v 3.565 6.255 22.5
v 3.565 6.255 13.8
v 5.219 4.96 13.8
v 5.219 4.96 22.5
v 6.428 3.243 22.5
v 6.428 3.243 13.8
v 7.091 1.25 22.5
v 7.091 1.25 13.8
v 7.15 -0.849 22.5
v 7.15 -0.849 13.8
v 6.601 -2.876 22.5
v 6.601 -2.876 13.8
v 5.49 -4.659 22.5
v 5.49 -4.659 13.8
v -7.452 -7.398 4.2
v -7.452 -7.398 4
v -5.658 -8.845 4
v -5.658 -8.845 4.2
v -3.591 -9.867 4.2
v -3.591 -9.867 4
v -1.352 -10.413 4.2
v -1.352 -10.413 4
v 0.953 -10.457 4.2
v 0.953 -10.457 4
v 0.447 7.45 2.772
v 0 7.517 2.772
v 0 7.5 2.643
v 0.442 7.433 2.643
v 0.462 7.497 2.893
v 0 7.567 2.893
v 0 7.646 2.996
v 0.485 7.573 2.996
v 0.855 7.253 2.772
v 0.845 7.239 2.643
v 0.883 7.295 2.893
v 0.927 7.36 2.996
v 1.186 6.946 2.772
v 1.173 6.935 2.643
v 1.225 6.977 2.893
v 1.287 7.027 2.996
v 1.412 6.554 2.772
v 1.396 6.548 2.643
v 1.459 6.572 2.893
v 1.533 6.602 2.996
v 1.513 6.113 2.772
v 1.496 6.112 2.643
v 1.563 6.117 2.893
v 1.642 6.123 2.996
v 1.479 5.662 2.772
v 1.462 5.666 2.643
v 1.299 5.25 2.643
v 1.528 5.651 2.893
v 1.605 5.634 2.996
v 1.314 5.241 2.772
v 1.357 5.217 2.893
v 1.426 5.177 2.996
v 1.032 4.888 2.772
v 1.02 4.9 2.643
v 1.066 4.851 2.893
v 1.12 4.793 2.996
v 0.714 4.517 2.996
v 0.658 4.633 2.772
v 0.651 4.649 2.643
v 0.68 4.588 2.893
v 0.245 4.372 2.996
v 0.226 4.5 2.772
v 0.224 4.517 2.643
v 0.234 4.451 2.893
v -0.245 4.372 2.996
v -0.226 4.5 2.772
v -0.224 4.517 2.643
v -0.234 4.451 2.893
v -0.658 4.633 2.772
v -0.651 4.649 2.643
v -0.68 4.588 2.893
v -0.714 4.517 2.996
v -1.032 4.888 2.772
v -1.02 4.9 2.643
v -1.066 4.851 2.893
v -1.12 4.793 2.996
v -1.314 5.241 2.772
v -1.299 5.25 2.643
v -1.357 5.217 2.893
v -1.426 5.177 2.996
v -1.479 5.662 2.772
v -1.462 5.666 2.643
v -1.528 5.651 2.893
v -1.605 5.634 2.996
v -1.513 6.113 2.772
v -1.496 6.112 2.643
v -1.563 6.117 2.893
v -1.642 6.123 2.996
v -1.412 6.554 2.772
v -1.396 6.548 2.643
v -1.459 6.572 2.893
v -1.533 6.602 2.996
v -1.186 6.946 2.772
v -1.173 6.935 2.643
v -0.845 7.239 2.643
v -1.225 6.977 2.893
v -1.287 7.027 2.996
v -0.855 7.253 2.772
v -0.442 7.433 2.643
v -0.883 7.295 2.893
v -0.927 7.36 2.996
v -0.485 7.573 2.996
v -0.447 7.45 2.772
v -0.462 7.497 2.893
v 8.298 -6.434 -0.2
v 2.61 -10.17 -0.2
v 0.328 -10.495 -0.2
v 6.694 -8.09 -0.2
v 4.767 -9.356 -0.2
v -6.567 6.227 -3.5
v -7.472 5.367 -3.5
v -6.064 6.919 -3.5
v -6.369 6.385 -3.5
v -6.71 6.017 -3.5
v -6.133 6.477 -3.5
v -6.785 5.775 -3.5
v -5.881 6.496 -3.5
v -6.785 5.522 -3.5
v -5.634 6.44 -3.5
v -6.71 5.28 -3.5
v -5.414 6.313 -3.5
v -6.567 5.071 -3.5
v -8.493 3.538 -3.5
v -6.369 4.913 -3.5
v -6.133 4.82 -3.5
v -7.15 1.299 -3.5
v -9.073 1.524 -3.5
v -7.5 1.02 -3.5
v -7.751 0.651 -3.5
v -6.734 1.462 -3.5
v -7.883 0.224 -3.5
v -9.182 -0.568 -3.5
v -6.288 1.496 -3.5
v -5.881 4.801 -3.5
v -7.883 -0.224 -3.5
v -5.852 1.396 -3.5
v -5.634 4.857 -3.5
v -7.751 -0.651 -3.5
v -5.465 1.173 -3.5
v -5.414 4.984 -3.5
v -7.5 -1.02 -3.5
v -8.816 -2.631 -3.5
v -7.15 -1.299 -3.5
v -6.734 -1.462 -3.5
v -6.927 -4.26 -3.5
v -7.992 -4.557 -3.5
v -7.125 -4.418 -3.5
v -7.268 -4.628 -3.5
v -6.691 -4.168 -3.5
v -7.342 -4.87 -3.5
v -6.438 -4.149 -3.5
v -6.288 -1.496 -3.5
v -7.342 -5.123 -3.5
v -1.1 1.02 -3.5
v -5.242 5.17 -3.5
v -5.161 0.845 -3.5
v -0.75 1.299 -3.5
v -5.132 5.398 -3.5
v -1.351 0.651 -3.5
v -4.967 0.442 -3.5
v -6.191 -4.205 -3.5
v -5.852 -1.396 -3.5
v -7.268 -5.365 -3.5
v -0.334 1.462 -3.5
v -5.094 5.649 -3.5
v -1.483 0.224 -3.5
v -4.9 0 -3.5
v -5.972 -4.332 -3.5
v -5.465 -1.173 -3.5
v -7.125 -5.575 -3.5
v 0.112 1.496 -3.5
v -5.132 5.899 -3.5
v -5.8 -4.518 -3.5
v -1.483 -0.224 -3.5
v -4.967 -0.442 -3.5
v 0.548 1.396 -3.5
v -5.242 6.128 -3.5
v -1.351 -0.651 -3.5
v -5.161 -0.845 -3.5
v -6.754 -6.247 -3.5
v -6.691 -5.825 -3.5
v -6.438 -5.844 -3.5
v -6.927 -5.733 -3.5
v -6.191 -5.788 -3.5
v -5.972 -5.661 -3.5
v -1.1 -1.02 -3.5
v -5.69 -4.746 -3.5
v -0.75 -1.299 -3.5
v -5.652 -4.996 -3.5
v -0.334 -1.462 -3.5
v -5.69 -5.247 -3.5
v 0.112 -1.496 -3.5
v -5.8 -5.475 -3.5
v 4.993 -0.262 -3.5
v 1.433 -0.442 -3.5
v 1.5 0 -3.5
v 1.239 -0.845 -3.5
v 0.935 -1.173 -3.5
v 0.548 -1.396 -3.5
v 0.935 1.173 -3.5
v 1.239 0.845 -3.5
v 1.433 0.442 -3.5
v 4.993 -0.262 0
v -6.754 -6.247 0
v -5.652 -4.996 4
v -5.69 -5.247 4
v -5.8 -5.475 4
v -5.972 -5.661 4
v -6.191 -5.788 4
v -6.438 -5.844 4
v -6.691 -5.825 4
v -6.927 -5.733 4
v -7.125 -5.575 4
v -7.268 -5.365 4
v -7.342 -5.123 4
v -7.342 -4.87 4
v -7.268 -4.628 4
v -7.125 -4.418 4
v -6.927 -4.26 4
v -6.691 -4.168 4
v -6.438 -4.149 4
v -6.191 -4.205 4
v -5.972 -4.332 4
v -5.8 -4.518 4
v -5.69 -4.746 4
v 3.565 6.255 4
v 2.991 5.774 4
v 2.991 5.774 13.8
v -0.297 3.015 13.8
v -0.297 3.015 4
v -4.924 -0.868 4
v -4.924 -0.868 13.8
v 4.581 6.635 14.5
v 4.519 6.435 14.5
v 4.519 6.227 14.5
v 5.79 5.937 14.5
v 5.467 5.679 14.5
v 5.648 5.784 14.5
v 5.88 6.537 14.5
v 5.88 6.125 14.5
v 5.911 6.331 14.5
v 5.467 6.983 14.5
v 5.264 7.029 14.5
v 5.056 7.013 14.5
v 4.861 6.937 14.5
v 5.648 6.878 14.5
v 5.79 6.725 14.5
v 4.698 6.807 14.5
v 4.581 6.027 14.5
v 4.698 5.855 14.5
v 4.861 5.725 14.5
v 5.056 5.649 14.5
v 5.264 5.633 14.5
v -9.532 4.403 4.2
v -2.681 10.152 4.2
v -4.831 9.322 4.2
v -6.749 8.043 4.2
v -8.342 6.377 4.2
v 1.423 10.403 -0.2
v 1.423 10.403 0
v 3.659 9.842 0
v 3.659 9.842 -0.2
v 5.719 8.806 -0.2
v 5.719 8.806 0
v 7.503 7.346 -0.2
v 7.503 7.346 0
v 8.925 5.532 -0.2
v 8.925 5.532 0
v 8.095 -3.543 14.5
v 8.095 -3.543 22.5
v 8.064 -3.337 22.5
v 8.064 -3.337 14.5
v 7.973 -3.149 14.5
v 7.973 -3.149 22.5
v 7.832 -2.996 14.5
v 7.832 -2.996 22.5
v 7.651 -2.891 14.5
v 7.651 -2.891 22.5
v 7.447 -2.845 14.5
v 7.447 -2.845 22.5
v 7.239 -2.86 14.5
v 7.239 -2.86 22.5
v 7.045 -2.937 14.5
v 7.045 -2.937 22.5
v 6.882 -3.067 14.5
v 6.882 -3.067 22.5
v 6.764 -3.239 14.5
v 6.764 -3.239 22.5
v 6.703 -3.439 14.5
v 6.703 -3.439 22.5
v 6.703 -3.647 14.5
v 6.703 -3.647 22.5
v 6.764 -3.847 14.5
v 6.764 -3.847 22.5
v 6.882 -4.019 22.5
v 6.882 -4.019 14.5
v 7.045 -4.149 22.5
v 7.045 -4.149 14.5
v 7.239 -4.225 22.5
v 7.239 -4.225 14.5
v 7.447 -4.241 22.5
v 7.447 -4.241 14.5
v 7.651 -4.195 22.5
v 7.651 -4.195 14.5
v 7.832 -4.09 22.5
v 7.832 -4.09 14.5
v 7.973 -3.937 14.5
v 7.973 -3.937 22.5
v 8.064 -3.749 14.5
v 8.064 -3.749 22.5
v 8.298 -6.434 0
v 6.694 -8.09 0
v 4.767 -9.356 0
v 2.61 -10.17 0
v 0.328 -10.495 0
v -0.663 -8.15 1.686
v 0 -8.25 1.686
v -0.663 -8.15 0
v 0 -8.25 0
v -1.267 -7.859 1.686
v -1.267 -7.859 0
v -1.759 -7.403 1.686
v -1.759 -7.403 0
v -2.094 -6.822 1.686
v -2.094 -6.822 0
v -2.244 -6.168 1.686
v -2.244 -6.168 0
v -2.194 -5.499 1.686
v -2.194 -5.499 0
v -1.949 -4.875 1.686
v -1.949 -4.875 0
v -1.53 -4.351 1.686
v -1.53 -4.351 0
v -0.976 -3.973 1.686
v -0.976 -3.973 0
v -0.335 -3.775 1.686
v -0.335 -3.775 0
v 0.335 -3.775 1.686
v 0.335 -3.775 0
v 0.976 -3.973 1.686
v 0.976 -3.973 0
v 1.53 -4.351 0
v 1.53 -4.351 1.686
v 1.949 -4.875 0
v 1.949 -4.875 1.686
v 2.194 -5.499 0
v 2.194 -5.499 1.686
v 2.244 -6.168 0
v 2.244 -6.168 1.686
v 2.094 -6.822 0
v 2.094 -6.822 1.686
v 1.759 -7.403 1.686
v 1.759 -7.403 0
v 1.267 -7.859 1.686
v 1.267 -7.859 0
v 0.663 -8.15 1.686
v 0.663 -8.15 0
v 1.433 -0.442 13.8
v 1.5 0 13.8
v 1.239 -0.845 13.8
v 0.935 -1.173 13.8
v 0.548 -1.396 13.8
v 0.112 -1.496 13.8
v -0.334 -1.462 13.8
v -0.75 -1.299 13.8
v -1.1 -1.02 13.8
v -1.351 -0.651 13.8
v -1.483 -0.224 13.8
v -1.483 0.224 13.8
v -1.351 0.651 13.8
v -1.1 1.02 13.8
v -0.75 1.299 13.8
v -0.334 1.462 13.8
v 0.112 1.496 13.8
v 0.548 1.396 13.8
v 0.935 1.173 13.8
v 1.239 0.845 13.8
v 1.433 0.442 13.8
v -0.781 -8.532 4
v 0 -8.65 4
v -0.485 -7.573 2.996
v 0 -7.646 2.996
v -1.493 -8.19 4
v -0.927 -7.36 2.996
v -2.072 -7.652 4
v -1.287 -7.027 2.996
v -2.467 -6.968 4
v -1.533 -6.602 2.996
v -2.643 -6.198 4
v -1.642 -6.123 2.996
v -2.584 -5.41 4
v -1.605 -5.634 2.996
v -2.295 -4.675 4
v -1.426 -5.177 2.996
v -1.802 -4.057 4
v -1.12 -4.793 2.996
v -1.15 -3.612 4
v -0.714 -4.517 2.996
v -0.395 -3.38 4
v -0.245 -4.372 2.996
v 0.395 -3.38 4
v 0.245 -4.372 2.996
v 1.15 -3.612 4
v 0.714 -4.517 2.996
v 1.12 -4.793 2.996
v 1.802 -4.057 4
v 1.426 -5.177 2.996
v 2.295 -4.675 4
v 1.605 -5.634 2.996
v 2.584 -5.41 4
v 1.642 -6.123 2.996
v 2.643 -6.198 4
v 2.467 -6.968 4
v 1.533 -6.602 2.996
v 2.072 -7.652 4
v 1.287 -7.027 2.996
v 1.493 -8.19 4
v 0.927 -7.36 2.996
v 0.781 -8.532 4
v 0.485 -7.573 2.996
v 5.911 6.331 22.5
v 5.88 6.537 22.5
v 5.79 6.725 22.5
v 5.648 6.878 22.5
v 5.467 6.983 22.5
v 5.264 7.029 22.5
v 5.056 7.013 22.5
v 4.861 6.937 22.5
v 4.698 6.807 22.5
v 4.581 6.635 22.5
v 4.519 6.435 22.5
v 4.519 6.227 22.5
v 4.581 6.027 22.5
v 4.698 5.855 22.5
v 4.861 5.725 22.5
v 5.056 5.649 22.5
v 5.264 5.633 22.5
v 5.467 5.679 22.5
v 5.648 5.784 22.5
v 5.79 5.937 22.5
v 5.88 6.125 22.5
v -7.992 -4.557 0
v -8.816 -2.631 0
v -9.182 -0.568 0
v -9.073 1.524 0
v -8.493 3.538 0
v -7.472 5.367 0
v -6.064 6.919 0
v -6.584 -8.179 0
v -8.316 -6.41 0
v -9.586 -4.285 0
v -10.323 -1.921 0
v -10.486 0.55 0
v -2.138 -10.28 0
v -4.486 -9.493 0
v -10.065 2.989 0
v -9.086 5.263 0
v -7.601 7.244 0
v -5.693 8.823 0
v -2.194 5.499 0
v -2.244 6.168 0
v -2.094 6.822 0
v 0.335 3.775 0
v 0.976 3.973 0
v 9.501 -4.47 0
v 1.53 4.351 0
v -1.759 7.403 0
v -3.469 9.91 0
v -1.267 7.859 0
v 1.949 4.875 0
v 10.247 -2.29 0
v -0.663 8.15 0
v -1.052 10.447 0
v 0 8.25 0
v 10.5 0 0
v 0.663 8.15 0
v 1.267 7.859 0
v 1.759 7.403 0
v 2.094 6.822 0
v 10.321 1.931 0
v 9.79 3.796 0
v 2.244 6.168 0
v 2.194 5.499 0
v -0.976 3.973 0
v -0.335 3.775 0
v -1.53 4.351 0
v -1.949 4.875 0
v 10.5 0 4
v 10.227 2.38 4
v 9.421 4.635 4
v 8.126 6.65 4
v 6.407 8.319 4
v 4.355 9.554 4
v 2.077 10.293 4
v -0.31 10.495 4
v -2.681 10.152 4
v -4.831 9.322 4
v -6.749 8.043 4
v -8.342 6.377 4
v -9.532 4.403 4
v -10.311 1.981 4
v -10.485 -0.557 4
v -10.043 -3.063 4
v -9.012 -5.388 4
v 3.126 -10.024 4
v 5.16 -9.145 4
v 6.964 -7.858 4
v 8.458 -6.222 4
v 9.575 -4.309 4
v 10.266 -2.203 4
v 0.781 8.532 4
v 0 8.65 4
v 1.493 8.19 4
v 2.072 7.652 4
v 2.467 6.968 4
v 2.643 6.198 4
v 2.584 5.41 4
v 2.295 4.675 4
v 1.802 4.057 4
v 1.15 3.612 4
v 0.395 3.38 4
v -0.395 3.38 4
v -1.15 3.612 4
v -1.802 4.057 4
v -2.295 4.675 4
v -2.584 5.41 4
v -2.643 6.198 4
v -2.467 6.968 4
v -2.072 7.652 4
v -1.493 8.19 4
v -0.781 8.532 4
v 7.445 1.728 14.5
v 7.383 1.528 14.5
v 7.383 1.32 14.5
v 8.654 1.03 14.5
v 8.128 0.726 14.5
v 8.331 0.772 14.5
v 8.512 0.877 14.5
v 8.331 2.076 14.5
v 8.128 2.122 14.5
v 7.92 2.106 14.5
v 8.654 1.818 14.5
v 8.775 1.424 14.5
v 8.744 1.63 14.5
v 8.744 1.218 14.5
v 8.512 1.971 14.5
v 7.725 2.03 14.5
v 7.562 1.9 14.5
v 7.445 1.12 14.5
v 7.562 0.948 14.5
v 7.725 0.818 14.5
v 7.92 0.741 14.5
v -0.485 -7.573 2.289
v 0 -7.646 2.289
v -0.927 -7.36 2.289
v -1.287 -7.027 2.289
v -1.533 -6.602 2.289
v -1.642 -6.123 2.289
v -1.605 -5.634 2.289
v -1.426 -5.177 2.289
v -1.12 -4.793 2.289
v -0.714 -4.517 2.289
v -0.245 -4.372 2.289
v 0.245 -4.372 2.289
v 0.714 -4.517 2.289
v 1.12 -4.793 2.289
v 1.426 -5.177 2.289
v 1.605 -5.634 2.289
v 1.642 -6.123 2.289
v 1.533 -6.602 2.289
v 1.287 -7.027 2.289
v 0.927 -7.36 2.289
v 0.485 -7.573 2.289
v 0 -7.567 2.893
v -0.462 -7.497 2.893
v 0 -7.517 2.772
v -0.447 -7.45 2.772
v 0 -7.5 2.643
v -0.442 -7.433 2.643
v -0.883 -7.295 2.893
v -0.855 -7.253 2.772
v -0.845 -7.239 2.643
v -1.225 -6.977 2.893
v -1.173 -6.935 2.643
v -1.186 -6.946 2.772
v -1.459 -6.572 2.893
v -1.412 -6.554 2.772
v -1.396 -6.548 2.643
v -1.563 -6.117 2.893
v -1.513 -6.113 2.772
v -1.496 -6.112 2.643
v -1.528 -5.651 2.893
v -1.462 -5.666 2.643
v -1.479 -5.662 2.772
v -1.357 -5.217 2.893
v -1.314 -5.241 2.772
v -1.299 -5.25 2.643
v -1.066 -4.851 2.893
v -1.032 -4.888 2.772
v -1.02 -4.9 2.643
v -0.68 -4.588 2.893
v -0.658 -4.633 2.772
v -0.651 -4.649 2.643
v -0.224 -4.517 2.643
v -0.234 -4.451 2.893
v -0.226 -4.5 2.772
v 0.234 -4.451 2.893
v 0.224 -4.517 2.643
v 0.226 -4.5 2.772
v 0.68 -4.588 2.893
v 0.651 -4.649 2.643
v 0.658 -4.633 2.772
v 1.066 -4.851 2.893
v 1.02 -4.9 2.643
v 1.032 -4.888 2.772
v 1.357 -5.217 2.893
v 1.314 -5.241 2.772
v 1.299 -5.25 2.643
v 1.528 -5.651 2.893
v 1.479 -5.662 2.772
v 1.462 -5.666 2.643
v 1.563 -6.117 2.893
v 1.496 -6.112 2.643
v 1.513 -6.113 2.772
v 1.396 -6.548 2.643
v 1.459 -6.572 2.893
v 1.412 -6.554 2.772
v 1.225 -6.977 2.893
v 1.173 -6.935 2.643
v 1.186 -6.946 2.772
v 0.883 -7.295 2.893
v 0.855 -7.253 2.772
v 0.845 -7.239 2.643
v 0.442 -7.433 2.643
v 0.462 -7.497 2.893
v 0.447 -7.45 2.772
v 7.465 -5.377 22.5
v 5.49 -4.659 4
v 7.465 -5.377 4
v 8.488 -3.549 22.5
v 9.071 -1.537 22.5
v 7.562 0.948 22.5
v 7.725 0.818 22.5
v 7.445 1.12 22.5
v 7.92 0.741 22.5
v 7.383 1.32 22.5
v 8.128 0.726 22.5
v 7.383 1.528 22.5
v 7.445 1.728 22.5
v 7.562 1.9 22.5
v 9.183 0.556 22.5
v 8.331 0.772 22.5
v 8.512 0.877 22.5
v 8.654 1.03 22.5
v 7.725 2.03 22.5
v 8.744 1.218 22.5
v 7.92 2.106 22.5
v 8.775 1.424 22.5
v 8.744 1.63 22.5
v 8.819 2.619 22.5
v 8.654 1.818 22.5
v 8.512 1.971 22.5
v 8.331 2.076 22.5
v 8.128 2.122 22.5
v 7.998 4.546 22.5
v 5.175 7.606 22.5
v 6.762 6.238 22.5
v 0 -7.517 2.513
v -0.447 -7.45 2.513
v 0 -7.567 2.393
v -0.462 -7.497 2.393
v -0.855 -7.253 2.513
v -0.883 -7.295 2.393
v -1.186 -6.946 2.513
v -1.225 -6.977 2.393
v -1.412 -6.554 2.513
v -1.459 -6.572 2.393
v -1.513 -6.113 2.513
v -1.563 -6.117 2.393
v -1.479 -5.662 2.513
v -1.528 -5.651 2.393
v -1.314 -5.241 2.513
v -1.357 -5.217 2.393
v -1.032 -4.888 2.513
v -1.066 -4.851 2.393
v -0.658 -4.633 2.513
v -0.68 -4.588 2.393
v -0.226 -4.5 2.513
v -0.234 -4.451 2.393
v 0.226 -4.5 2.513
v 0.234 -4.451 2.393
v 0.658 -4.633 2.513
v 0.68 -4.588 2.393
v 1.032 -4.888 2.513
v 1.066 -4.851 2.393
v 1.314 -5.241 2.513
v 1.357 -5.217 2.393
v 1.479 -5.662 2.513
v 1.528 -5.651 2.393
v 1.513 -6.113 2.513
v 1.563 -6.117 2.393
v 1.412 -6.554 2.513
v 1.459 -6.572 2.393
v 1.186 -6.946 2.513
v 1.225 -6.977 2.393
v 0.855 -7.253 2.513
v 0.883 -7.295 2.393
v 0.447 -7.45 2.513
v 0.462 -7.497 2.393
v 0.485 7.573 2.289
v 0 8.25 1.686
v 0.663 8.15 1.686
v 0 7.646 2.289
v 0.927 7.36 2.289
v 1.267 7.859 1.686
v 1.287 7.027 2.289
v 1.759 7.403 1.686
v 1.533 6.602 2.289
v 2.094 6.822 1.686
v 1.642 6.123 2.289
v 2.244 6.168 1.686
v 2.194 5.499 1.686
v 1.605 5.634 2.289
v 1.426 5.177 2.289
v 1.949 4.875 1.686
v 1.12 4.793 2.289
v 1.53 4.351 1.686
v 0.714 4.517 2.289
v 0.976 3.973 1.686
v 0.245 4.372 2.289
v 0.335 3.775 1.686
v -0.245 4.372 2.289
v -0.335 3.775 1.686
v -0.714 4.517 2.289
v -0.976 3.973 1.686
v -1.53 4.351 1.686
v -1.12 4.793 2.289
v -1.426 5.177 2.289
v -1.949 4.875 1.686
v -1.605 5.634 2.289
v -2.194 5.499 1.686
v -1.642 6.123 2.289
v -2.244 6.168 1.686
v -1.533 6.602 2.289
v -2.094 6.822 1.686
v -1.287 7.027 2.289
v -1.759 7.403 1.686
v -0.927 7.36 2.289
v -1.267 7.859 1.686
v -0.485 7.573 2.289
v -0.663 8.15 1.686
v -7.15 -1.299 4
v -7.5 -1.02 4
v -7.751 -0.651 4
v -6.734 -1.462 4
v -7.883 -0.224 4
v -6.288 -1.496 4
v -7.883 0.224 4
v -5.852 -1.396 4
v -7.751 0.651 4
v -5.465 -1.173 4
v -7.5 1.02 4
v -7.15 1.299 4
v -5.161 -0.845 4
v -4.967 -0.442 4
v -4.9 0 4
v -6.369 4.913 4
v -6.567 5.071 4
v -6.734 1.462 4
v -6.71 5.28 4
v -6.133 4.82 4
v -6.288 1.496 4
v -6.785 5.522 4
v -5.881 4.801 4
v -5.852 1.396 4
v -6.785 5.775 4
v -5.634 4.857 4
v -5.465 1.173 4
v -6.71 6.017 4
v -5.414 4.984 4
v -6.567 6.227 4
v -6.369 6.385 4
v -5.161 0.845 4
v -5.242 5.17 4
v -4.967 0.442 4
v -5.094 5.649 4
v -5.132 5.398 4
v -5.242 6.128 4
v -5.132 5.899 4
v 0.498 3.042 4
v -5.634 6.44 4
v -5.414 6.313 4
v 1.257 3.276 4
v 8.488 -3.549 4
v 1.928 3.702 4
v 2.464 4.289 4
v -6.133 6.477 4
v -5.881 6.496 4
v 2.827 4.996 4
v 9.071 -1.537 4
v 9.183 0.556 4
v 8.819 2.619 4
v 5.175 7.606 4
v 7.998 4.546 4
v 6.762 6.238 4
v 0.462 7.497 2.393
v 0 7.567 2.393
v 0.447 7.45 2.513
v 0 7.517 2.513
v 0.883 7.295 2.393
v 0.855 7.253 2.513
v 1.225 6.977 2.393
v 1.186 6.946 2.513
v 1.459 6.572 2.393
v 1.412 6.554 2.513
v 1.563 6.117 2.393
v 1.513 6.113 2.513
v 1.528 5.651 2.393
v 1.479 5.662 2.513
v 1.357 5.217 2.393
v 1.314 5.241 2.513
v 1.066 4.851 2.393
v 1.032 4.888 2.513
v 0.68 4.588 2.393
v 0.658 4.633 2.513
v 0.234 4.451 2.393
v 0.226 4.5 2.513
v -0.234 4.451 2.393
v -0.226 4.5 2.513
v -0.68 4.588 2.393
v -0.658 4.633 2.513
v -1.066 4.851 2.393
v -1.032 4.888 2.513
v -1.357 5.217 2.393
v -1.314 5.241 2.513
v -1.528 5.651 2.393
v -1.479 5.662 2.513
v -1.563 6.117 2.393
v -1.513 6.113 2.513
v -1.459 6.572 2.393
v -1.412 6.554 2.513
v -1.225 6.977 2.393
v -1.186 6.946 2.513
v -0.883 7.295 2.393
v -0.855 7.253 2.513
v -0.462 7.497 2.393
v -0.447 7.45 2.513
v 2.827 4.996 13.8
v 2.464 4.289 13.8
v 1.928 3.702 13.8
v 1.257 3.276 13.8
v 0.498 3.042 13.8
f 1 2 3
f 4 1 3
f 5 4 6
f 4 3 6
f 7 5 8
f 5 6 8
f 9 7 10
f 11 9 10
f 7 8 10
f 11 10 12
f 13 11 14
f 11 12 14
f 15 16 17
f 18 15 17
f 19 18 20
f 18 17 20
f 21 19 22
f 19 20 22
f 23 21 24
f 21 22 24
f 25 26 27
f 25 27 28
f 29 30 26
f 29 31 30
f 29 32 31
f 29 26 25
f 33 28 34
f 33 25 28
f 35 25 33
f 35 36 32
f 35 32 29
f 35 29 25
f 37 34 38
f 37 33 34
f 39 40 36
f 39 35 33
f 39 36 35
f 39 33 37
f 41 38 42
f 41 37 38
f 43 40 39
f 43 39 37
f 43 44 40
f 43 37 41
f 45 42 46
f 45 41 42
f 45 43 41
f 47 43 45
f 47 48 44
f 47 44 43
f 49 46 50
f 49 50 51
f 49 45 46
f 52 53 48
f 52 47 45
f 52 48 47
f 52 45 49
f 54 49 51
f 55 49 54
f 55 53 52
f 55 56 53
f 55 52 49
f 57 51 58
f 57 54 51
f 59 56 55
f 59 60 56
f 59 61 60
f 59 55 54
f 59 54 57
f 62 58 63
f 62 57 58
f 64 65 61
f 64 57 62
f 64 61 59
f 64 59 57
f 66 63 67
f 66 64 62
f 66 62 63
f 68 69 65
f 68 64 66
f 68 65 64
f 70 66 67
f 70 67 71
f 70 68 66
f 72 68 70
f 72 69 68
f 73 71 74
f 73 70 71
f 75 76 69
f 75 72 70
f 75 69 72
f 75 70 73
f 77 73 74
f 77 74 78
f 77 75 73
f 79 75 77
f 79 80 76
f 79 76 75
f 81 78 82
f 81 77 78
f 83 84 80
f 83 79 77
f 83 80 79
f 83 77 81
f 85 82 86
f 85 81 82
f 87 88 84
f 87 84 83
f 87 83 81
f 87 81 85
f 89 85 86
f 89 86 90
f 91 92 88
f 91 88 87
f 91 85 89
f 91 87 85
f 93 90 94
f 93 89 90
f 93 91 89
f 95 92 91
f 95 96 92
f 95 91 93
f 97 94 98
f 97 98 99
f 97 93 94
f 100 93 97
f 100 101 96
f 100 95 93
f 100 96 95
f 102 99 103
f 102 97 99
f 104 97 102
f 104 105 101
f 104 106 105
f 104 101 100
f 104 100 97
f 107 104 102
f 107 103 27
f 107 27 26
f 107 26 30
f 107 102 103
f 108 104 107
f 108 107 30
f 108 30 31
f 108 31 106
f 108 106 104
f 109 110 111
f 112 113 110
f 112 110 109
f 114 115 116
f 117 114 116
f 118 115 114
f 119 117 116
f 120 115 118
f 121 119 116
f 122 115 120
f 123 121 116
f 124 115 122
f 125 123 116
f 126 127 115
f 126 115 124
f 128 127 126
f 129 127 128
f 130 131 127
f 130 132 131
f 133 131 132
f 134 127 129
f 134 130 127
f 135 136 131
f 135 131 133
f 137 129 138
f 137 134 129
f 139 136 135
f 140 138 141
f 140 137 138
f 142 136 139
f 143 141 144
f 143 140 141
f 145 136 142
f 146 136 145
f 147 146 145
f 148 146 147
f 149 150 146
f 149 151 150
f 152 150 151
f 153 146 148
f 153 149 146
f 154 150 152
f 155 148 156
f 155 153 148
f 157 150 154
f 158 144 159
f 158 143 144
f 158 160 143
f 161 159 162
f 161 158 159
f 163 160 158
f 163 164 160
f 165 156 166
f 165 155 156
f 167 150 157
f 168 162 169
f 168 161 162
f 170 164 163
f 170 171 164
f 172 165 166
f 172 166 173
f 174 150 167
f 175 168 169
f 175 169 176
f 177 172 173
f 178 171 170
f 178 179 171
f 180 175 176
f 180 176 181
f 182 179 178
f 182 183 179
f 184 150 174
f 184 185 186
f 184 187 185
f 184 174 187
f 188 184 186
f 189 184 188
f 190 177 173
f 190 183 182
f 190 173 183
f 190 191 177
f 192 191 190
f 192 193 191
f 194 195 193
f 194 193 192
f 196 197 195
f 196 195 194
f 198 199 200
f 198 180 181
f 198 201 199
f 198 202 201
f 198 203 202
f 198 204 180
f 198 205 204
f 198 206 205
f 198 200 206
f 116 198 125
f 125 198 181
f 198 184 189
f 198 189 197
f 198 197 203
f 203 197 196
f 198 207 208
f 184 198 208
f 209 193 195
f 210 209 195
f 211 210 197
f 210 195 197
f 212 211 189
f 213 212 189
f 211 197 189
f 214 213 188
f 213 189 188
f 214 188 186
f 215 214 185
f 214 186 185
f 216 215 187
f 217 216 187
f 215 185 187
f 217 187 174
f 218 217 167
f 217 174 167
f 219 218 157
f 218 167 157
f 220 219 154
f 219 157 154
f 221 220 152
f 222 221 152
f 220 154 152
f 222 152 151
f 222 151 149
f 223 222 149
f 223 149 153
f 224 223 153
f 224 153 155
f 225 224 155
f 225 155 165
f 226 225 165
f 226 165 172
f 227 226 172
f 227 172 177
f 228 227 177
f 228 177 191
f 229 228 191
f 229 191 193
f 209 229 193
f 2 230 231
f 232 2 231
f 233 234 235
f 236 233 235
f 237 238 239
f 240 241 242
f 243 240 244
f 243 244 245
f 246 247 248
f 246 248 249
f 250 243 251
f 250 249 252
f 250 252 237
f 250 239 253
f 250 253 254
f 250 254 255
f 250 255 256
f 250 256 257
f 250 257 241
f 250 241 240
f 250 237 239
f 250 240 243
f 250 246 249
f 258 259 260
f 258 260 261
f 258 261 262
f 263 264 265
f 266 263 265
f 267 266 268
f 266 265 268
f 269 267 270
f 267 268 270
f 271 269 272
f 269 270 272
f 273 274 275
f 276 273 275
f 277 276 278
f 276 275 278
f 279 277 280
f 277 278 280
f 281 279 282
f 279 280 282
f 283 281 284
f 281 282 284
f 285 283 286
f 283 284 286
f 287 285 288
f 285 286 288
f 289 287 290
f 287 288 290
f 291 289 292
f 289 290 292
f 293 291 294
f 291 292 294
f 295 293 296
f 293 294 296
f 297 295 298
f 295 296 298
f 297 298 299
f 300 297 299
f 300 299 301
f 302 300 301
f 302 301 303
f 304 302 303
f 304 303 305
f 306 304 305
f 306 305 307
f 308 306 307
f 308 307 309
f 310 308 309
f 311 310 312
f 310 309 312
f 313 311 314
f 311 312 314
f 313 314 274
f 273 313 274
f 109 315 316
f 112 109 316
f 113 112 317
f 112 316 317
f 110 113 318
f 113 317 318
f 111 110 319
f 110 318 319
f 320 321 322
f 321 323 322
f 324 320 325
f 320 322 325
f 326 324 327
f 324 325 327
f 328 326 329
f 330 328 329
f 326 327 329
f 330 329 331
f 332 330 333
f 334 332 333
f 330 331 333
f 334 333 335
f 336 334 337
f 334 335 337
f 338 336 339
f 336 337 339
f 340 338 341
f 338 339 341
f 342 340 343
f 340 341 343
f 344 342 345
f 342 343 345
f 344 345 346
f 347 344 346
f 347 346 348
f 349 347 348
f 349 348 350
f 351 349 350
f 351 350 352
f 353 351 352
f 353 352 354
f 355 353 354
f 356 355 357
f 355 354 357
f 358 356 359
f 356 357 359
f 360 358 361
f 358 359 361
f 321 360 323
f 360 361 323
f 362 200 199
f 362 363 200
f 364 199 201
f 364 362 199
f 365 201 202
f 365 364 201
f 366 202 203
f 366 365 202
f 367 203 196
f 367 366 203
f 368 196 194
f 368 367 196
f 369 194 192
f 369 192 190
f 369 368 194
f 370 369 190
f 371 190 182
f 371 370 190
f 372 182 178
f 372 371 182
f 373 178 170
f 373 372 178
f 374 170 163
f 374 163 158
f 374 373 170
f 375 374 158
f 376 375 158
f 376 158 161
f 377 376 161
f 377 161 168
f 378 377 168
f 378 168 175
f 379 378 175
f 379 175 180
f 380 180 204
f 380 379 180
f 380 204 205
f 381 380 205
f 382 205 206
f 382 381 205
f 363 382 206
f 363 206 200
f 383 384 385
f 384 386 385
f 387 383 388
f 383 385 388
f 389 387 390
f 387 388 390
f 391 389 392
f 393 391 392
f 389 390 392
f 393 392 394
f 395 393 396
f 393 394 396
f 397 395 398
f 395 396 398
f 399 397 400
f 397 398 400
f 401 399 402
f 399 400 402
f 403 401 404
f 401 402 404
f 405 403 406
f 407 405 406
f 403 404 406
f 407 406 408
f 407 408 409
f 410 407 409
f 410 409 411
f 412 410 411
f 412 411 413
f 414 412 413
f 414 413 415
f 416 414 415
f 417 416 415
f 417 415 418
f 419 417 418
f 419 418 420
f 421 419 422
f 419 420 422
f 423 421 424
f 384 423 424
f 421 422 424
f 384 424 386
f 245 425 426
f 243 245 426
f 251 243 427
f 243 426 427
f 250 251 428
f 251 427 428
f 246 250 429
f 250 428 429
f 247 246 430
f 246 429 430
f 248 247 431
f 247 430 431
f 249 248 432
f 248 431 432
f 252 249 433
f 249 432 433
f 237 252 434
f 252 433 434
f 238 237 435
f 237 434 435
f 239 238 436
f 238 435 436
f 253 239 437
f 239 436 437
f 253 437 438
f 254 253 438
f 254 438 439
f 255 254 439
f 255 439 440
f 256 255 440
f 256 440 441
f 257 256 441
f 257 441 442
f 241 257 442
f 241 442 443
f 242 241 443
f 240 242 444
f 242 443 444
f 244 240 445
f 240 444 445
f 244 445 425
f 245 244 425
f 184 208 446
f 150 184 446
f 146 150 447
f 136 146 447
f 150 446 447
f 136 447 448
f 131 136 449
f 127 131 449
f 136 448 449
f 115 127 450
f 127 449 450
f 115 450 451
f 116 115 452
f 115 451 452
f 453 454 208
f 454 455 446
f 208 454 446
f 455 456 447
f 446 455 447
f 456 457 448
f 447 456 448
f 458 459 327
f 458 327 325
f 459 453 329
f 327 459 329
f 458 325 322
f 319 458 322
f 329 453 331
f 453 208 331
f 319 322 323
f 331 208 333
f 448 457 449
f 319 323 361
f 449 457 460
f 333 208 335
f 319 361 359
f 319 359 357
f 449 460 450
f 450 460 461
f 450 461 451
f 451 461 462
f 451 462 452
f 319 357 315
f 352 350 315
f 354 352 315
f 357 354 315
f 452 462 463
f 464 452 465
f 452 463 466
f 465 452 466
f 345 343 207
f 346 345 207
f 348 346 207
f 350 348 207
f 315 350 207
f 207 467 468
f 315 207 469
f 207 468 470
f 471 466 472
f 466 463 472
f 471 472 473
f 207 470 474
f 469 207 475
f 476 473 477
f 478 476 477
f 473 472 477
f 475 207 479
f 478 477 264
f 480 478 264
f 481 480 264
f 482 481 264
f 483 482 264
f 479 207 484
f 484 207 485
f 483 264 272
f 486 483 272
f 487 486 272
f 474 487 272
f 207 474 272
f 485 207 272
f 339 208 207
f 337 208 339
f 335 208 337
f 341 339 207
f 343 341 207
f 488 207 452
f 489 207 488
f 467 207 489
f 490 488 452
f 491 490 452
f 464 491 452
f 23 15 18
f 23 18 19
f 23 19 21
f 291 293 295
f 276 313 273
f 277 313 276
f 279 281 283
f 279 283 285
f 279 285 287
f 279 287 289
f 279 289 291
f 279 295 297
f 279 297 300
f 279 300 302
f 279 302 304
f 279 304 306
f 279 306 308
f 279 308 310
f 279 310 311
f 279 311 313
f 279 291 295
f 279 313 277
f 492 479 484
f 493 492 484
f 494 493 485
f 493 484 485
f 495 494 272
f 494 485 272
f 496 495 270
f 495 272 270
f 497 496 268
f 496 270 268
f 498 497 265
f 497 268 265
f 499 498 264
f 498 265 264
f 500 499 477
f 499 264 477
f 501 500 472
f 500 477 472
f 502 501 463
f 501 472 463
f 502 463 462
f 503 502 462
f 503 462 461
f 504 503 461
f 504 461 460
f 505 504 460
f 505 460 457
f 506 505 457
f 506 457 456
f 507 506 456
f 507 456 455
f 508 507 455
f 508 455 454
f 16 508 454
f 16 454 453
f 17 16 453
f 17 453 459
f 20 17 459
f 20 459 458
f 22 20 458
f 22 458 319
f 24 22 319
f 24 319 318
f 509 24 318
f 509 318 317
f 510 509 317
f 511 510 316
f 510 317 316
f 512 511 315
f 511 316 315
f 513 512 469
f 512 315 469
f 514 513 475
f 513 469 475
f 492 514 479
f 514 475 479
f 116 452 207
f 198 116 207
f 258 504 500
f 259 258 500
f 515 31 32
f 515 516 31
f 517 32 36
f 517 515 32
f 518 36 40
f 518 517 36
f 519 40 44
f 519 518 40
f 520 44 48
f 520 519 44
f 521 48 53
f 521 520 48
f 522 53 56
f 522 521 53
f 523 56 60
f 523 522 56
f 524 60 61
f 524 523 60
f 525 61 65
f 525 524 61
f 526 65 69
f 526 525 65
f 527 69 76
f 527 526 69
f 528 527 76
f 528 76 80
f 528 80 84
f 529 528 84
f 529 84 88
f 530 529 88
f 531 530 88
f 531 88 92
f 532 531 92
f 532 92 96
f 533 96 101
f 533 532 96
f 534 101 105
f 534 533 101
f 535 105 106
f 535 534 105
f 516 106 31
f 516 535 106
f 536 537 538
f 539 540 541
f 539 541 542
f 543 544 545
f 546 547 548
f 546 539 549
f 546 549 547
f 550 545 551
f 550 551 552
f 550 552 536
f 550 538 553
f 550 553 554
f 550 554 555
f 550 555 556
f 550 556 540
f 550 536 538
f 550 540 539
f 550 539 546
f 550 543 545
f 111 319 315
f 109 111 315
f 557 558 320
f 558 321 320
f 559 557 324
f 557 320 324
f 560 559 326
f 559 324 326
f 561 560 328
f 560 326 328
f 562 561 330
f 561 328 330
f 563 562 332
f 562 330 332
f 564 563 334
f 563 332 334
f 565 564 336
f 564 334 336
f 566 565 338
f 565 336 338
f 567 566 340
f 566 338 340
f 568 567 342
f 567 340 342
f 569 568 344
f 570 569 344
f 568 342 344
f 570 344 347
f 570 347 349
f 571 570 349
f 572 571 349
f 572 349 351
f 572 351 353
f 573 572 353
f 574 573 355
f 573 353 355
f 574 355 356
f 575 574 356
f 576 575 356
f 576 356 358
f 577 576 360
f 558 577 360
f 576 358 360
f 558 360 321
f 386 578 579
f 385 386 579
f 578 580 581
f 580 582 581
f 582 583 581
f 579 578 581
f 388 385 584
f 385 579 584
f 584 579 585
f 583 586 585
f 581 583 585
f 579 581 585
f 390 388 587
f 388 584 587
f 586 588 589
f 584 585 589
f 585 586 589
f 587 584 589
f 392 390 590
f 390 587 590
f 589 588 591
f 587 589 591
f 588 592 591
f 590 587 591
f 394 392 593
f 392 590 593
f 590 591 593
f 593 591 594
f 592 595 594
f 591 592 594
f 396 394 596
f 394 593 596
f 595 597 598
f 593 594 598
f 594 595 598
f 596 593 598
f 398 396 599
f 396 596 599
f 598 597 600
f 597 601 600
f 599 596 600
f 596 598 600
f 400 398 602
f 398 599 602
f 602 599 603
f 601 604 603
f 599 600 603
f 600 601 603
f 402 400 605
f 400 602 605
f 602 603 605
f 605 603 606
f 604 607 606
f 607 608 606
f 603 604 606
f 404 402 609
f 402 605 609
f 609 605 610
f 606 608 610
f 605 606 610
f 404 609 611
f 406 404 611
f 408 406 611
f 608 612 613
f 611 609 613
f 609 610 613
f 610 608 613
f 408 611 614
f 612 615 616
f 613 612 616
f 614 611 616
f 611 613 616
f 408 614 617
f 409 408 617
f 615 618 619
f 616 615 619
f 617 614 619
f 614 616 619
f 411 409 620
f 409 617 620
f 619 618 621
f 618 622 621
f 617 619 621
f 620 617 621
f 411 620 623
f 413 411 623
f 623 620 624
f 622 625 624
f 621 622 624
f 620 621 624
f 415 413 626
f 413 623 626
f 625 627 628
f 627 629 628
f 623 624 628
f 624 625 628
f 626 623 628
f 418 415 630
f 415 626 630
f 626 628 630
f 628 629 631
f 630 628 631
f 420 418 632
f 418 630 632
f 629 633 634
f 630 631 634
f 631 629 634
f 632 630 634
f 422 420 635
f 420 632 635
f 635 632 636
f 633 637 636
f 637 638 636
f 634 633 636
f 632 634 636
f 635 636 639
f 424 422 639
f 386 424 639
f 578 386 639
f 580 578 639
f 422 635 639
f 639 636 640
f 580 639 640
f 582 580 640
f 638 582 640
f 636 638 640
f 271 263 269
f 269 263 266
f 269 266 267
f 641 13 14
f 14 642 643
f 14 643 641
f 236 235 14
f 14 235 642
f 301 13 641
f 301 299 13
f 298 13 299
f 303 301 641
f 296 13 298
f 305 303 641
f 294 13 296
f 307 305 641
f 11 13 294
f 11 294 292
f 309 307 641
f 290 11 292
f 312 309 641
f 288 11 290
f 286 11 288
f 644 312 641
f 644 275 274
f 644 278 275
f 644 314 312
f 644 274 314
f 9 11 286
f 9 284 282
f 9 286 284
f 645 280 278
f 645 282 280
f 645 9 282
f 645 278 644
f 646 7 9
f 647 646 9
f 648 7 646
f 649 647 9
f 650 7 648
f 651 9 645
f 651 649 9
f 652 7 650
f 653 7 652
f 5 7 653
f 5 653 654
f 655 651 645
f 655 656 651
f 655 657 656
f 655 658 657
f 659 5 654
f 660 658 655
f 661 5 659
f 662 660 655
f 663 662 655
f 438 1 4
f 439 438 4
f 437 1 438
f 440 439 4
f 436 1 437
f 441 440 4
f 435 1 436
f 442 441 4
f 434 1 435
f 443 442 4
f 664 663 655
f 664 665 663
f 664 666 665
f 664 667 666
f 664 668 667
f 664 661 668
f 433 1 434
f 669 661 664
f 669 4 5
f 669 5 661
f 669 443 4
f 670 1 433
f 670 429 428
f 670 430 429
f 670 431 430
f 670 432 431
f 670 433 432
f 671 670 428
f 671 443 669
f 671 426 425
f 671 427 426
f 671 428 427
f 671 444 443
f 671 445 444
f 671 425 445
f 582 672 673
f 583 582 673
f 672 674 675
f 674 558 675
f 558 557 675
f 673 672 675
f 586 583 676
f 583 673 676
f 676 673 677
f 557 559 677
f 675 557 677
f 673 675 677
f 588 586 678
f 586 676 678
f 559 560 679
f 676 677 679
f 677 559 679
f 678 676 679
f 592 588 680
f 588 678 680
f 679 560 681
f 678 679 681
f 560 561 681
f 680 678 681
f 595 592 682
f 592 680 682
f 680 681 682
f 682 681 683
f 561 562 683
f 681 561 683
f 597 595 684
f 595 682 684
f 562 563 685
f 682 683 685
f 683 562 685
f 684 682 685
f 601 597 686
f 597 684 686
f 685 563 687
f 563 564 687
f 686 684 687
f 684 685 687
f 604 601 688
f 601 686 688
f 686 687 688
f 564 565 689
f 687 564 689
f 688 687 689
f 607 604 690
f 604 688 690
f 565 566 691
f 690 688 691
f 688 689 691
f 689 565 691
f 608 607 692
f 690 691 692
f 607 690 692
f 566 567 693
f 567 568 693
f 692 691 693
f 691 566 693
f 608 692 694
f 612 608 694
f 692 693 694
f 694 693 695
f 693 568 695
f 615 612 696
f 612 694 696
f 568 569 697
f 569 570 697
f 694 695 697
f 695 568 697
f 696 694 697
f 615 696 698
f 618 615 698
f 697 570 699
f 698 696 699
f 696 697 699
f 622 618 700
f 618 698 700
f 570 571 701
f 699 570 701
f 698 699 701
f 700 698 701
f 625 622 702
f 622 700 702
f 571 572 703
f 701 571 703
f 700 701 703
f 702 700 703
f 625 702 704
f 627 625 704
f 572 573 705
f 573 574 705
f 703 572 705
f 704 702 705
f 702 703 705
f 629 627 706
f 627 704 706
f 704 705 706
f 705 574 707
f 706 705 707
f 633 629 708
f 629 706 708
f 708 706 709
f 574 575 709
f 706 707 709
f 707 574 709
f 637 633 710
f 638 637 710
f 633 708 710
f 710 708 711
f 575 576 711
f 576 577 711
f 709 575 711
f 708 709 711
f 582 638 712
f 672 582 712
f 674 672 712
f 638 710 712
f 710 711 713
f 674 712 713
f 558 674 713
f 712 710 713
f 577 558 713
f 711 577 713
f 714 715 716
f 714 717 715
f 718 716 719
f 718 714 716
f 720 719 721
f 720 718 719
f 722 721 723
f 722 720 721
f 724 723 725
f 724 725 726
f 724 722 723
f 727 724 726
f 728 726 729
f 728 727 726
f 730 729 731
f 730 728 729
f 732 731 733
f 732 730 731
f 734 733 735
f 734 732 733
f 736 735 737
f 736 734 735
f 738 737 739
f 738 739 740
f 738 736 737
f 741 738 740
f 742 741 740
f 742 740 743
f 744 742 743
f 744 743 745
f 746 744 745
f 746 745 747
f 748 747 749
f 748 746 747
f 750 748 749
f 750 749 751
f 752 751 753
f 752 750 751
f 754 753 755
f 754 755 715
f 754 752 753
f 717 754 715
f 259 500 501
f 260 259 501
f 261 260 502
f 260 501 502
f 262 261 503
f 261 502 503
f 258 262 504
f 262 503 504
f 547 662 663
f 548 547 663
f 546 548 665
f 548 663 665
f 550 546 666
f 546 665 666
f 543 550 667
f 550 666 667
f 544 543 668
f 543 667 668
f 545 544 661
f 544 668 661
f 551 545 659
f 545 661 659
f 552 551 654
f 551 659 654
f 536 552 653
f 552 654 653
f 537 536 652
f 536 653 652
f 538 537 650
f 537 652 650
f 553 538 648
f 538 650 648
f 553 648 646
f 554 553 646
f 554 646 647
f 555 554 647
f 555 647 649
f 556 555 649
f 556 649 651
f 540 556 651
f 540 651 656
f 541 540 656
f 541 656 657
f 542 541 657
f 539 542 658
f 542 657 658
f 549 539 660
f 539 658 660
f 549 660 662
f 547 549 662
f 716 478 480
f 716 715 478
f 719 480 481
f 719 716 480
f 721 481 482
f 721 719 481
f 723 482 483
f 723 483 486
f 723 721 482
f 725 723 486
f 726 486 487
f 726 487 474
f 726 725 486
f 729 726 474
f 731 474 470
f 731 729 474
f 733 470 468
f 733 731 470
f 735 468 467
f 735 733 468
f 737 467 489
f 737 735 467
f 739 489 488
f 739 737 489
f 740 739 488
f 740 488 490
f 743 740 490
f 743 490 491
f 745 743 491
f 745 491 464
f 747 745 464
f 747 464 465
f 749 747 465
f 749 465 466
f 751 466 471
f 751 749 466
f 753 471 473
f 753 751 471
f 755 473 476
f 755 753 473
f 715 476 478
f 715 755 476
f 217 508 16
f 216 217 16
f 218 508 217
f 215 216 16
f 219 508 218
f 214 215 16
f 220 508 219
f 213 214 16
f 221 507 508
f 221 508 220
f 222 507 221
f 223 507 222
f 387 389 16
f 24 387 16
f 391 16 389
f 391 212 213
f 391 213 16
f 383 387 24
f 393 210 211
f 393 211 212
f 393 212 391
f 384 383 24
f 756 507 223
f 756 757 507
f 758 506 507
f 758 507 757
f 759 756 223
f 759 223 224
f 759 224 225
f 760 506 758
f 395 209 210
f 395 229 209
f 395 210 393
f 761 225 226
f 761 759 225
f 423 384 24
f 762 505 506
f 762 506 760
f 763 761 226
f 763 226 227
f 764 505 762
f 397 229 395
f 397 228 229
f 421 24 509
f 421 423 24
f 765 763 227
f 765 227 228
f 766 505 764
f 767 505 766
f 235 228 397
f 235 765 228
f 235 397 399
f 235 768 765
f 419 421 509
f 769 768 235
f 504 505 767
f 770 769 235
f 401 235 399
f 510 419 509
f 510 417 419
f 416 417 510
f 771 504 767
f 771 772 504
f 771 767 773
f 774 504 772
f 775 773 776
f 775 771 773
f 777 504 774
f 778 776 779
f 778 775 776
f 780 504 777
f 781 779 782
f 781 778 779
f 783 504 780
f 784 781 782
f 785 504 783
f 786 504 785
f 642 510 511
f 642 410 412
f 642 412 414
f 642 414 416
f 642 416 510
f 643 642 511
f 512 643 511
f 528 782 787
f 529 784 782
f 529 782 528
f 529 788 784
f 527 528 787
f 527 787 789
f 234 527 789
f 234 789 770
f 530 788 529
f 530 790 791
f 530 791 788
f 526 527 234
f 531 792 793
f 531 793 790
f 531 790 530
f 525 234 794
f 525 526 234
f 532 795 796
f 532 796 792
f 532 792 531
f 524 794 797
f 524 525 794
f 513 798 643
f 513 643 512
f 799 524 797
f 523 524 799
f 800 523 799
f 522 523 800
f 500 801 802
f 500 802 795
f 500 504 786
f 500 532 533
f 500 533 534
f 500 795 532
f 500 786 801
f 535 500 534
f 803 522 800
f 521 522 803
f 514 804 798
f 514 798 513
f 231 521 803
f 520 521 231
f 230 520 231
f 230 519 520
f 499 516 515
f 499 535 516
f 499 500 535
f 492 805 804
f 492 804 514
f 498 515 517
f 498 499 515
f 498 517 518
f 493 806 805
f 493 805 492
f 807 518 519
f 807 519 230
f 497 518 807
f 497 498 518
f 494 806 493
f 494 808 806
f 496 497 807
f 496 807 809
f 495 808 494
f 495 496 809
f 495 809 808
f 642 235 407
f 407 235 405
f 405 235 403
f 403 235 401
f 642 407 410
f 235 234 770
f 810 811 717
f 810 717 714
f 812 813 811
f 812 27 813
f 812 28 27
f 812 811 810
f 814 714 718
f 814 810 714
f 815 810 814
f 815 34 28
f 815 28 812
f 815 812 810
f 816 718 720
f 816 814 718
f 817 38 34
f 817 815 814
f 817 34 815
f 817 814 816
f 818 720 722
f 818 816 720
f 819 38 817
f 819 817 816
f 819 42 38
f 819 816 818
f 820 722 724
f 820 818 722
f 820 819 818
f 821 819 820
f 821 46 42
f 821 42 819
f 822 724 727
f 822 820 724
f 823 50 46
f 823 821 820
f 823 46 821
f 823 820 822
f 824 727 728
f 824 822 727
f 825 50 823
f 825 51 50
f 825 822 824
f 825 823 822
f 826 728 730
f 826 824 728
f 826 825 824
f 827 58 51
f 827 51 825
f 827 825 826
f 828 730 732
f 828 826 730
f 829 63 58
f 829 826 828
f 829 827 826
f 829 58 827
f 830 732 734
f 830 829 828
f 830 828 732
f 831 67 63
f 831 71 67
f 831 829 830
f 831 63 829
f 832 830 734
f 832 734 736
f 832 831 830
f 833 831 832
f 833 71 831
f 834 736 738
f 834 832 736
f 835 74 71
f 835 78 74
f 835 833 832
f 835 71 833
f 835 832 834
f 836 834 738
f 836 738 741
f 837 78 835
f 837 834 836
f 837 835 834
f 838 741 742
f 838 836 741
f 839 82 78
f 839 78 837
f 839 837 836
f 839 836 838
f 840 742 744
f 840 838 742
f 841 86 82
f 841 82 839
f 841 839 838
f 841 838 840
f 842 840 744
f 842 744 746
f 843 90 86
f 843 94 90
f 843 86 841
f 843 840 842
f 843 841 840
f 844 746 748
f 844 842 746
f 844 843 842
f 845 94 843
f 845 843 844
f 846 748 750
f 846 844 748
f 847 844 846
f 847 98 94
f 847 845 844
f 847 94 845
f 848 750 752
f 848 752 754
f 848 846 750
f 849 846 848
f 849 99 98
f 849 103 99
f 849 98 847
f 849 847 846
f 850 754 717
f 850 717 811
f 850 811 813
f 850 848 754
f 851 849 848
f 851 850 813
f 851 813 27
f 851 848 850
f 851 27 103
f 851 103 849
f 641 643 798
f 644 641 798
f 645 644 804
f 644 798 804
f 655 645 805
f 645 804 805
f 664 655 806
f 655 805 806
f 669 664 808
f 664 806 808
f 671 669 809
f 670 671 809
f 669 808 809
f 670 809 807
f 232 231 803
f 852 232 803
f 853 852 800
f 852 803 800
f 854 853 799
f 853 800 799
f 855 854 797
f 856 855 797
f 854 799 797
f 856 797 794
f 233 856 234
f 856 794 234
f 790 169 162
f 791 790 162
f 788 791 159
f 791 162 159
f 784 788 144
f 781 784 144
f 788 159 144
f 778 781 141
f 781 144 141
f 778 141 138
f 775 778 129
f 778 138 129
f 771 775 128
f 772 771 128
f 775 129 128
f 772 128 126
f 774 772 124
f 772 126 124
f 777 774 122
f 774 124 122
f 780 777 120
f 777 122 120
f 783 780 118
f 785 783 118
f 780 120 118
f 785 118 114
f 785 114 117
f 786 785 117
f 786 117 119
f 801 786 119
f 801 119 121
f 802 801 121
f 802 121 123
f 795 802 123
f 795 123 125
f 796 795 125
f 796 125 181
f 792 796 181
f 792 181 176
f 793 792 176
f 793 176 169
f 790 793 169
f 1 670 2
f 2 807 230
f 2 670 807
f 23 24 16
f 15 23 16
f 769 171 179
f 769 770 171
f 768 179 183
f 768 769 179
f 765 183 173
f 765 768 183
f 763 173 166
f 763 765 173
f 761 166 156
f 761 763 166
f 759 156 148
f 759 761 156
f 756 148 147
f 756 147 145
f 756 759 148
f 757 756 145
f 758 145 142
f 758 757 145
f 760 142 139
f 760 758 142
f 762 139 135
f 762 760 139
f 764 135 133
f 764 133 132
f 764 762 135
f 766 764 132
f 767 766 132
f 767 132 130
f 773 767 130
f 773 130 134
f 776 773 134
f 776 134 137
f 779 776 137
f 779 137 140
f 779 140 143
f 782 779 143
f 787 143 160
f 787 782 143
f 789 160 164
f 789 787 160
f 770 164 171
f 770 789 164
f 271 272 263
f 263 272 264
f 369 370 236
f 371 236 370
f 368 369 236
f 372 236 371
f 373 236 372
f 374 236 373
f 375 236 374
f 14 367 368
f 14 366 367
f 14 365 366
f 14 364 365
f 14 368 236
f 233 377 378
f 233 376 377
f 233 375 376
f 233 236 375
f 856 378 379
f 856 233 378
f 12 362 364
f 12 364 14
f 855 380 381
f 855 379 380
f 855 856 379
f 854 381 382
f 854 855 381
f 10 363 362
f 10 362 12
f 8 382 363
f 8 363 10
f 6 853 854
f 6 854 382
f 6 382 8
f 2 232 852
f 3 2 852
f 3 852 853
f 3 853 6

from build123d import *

# Parameters (mm, degrees)
F0_R      = 10.5
F0_R_2    = 1.5
F1_DEPTH  = 4
F6_DEPTH  = 0.2
F5_R      = 1.5
F7_DEPTH  = 9.8
F8_DEPTH  = 18.5
F9_R      = 0.7
F10_DEPTH = 8
F11_R     = 1.5
F12_DEPTH = 3.5
F13_R     = 0.85
F14_DEPTH = 26.001
F15_DEPTH = 0.2


with BuildPart() as f1:
    # F0 (on Top) → F1 (new body)
    with BuildSketch(Plane.XY):
        Circle(F0_R)
        with Locations((0, -6)):
            Circle(F0_R_2, mode=Mode.SUBTRACT)
        with Locations((-6.4, 0)):
            Circle(F0_R_2, mode=Mode.SUBTRACT)
        Circle(F0_R_2, mode=Mode.SUBTRACT)
        with Locations((0, 6)):
            Circle(F0_R_2, mode=Mode.SUBTRACT)
    extrude(amount=F1_DEPTH)

    # F2 (on Right) → F3 (revolve, cut)
    with BuildSketch(Plane.YZ):
        with BuildLine():
            Line((-7.5, 0), (-7.5, 2.6428932188))
            ThreePointArc((-7.5, 2.6428932188), (-7.5380602337, 2.4515515026), (-7.6464466094, 2.2893398282))
            Line((-7.6464466094, 2.2893398282), (-8.25, 1.6857864376))
            Line((-8.25, 1.6857864376), (-8.25, 0))
            Line((-8.25, 0), (-7.5, 0))
        make_face()
        with BuildLine():
            Line((-8.65, 4), (-7.6464466094, 2.9964466094))
            ThreePointArc((-7.6464466094, 2.9964466094), (-7.5380602337, 2.834234935), (-7.5, 2.6428932188))
            Line((-7.5, 2.6428932188), (-7.5, 4))
            Line((-7.5, 4), (-8.65, 4))
        make_face()
    revolve(axis=Axis((0, -6, 2), (0, 0, -1)), mode=Mode.SUBTRACT)

    # F2 (on Right) → F4 (revolve, cut)
    with BuildSketch(Plane.YZ):
        with BuildLine():
            Line((7.6464466094, 2.9964466094), (8.65, 4))
            Line((8.65, 4), (7.5, 4))
            Line((7.5, 4), (7.5, 2.6428932188))
            ThreePointArc((7.5, 2.6428932188), (7.5380602337, 2.834234935), (7.6464466094, 2.9964466094))
        make_face()
        with BuildLine():
            ThreePointArc((7.6464466094, 2.2893398282), (7.5380602337, 2.4515515026), (7.5, 2.6428932188))
            Line((7.5, 2.6428932188), (7.5, 0))
            Line((7.5, 0), (8.25, 0))
            Line((8.25, 0), (8.25, 1.6857864376))
            Line((8.25, 1.6857864376), (7.6464466094, 2.2893398282))
        make_face()
    revolve(axis=Axis((0, 6, 2), (0, 0, -1)), mode=Mode.SUBTRACT)

    # F5 (on face) → F6 (join)
    with BuildSketch(Plane.XY.offset(4)):
        with BuildLine():
            Line((-9.5323371892, 4.4027886289), (-2.6806273948, 10.1520557903))
            ThreePointArc((-2.6806273948, 10.1520557903), (-6.7492699017, 8.0434666527), (-9.5323371892, 4.4027886289))
        make_face()
        with BuildLine():
            ThreePointArc((-7.4516245177, -7.3975193172), (-3.5912115049, -9.8667725183), (0.9532417945, -10.4566404778))
            Line((0.9532417945, -10.4566404778), (-7.4516245177, -7.3975193172))
        make_face()
    extrude(amount=F6_DEPTH)

    # F5 (on face) → F7 (join)
    with BuildSketch(Plane.XY.offset(4)):
        with BuildLine():
            ThreePointArc((5.4897887319, -4.658564122), (7.0906158217, 1.2502668792), (3.5653911923, 6.2552366578))
            Line((3.5653911923, 6.2552366578), (2.9914480943, 5.7736412159))
            ThreePointArc((2.9914480943, 5.7736412159), (1.9283628291, 3.7018666706), (-0.2965396247, 3.0146919337))
            Line((-0.2965396247, 3.0146919337), (-4.9240387651, -0.8682408883))
            Line((-4.9240387651, -0.8682408883), (5.4897887319, -4.658564122))
        make_face()
        Circle(F5_R, mode=Mode.SUBTRACT)
    extrude(amount=F7_DEPTH)

    # F5 (on face) → F8 (join)
    with BuildSketch(Plane.XY.offset(4)):
        with BuildLine():
            ThreePointArc((7.4648121374, -5.3774138536), (9.0602313277, 1.5975632345), (5.1754450242, 7.6062322343))
            Line((5.1754450242, 7.6062322343), (3.5653911923, 6.2552366578))
            ThreePointArc((3.5653911923, 6.2552366578), (7.0906158217, 1.2502668792), (5.4897887319, -4.658564122))
            Line((5.4897887319, -4.658564122), (7.4648121374, -5.3774138536))
        make_face()
    extrude(amount=F8_DEPTH)

    # F9 (on face) → F10 (cut)
    with BuildSketch(Plane.XY.offset(22.5)):
        with Locations((5.2113912337, 6.3309873961)):
            Circle(F9_R)
        with Locations((8.0754235747, 1.4239150569)):
            Circle(F9_R)
        with Locations((7.3951047667, -3.5429402323)):
            Circle(F9_R)
    extrude(amount=-F10_DEPTH, mode=Mode.SUBTRACT)

    # F11 (on face) → F12 (join)
    with BuildSketch(Plane(origin=(0, 0, 0), x_dir=(1, 0, 0), z_dir=(0, 0, -1))):
        with BuildLine():
            ThreePointArc((-6.7538286642, 6.24706318), (-9.1873917197, -0.4814907974), (-6.0638345699, -6.9188084457))
            Line((-6.0638345699, -6.9188084457), (4.9931476738, 0.2616797812))
            Line((4.9931476738, 0.2616797812), (-6.7538286642, 6.24706318))
        make_face()
        with Locations((-6.4, 0)):
            Circle(F11_R, mode=Mode.SUBTRACT)
        Circle(F11_R, mode=Mode.SUBTRACT)
    extrude(amount=F12_DEPTH)

    # F13 (on face) → F14 (cut, through all)
    with BuildSketch(Plane(origin=(0, 0, -3.5), x_dir=(1, 0, 0), z_dir=(0, 0, -1))):
        with Locations((-5.9440995908, -5.6486883482)):
            Circle(F13_R)
        with Locations((-6.5019859038, 4.9964166467)):
            Circle(F13_R)
    extrude(amount=-F14_DEPTH, mode=Mode.SUBTRACT)

    # F11 (on face) → F15 (join)
    with BuildSketch(Plane(origin=(0, 0, 0), x_dir=(1, 0, 0), z_dir=(0, 0, -1))):
        with BuildLine():
            Line((8.924719634, -5.5316705845), (1.4234220313, -10.4030702065))
            ThreePointArc((1.4234220313, -10.4030702065), (5.7187098677, -8.8060409634), (8.924719634, -5.5316705845))
        make_face()
        with BuildLine():
            ThreePointArc((8.2976120605, 6.4342547427), (4.7669002473, 9.355568504), (0.3282074346, 10.4948692169))
            Line((0.3282074346, 10.4948692169), (8.2976120605, 6.4342547427))
        make_face()
    extrude(amount=F15_DEPTH)


solid = f1.part
